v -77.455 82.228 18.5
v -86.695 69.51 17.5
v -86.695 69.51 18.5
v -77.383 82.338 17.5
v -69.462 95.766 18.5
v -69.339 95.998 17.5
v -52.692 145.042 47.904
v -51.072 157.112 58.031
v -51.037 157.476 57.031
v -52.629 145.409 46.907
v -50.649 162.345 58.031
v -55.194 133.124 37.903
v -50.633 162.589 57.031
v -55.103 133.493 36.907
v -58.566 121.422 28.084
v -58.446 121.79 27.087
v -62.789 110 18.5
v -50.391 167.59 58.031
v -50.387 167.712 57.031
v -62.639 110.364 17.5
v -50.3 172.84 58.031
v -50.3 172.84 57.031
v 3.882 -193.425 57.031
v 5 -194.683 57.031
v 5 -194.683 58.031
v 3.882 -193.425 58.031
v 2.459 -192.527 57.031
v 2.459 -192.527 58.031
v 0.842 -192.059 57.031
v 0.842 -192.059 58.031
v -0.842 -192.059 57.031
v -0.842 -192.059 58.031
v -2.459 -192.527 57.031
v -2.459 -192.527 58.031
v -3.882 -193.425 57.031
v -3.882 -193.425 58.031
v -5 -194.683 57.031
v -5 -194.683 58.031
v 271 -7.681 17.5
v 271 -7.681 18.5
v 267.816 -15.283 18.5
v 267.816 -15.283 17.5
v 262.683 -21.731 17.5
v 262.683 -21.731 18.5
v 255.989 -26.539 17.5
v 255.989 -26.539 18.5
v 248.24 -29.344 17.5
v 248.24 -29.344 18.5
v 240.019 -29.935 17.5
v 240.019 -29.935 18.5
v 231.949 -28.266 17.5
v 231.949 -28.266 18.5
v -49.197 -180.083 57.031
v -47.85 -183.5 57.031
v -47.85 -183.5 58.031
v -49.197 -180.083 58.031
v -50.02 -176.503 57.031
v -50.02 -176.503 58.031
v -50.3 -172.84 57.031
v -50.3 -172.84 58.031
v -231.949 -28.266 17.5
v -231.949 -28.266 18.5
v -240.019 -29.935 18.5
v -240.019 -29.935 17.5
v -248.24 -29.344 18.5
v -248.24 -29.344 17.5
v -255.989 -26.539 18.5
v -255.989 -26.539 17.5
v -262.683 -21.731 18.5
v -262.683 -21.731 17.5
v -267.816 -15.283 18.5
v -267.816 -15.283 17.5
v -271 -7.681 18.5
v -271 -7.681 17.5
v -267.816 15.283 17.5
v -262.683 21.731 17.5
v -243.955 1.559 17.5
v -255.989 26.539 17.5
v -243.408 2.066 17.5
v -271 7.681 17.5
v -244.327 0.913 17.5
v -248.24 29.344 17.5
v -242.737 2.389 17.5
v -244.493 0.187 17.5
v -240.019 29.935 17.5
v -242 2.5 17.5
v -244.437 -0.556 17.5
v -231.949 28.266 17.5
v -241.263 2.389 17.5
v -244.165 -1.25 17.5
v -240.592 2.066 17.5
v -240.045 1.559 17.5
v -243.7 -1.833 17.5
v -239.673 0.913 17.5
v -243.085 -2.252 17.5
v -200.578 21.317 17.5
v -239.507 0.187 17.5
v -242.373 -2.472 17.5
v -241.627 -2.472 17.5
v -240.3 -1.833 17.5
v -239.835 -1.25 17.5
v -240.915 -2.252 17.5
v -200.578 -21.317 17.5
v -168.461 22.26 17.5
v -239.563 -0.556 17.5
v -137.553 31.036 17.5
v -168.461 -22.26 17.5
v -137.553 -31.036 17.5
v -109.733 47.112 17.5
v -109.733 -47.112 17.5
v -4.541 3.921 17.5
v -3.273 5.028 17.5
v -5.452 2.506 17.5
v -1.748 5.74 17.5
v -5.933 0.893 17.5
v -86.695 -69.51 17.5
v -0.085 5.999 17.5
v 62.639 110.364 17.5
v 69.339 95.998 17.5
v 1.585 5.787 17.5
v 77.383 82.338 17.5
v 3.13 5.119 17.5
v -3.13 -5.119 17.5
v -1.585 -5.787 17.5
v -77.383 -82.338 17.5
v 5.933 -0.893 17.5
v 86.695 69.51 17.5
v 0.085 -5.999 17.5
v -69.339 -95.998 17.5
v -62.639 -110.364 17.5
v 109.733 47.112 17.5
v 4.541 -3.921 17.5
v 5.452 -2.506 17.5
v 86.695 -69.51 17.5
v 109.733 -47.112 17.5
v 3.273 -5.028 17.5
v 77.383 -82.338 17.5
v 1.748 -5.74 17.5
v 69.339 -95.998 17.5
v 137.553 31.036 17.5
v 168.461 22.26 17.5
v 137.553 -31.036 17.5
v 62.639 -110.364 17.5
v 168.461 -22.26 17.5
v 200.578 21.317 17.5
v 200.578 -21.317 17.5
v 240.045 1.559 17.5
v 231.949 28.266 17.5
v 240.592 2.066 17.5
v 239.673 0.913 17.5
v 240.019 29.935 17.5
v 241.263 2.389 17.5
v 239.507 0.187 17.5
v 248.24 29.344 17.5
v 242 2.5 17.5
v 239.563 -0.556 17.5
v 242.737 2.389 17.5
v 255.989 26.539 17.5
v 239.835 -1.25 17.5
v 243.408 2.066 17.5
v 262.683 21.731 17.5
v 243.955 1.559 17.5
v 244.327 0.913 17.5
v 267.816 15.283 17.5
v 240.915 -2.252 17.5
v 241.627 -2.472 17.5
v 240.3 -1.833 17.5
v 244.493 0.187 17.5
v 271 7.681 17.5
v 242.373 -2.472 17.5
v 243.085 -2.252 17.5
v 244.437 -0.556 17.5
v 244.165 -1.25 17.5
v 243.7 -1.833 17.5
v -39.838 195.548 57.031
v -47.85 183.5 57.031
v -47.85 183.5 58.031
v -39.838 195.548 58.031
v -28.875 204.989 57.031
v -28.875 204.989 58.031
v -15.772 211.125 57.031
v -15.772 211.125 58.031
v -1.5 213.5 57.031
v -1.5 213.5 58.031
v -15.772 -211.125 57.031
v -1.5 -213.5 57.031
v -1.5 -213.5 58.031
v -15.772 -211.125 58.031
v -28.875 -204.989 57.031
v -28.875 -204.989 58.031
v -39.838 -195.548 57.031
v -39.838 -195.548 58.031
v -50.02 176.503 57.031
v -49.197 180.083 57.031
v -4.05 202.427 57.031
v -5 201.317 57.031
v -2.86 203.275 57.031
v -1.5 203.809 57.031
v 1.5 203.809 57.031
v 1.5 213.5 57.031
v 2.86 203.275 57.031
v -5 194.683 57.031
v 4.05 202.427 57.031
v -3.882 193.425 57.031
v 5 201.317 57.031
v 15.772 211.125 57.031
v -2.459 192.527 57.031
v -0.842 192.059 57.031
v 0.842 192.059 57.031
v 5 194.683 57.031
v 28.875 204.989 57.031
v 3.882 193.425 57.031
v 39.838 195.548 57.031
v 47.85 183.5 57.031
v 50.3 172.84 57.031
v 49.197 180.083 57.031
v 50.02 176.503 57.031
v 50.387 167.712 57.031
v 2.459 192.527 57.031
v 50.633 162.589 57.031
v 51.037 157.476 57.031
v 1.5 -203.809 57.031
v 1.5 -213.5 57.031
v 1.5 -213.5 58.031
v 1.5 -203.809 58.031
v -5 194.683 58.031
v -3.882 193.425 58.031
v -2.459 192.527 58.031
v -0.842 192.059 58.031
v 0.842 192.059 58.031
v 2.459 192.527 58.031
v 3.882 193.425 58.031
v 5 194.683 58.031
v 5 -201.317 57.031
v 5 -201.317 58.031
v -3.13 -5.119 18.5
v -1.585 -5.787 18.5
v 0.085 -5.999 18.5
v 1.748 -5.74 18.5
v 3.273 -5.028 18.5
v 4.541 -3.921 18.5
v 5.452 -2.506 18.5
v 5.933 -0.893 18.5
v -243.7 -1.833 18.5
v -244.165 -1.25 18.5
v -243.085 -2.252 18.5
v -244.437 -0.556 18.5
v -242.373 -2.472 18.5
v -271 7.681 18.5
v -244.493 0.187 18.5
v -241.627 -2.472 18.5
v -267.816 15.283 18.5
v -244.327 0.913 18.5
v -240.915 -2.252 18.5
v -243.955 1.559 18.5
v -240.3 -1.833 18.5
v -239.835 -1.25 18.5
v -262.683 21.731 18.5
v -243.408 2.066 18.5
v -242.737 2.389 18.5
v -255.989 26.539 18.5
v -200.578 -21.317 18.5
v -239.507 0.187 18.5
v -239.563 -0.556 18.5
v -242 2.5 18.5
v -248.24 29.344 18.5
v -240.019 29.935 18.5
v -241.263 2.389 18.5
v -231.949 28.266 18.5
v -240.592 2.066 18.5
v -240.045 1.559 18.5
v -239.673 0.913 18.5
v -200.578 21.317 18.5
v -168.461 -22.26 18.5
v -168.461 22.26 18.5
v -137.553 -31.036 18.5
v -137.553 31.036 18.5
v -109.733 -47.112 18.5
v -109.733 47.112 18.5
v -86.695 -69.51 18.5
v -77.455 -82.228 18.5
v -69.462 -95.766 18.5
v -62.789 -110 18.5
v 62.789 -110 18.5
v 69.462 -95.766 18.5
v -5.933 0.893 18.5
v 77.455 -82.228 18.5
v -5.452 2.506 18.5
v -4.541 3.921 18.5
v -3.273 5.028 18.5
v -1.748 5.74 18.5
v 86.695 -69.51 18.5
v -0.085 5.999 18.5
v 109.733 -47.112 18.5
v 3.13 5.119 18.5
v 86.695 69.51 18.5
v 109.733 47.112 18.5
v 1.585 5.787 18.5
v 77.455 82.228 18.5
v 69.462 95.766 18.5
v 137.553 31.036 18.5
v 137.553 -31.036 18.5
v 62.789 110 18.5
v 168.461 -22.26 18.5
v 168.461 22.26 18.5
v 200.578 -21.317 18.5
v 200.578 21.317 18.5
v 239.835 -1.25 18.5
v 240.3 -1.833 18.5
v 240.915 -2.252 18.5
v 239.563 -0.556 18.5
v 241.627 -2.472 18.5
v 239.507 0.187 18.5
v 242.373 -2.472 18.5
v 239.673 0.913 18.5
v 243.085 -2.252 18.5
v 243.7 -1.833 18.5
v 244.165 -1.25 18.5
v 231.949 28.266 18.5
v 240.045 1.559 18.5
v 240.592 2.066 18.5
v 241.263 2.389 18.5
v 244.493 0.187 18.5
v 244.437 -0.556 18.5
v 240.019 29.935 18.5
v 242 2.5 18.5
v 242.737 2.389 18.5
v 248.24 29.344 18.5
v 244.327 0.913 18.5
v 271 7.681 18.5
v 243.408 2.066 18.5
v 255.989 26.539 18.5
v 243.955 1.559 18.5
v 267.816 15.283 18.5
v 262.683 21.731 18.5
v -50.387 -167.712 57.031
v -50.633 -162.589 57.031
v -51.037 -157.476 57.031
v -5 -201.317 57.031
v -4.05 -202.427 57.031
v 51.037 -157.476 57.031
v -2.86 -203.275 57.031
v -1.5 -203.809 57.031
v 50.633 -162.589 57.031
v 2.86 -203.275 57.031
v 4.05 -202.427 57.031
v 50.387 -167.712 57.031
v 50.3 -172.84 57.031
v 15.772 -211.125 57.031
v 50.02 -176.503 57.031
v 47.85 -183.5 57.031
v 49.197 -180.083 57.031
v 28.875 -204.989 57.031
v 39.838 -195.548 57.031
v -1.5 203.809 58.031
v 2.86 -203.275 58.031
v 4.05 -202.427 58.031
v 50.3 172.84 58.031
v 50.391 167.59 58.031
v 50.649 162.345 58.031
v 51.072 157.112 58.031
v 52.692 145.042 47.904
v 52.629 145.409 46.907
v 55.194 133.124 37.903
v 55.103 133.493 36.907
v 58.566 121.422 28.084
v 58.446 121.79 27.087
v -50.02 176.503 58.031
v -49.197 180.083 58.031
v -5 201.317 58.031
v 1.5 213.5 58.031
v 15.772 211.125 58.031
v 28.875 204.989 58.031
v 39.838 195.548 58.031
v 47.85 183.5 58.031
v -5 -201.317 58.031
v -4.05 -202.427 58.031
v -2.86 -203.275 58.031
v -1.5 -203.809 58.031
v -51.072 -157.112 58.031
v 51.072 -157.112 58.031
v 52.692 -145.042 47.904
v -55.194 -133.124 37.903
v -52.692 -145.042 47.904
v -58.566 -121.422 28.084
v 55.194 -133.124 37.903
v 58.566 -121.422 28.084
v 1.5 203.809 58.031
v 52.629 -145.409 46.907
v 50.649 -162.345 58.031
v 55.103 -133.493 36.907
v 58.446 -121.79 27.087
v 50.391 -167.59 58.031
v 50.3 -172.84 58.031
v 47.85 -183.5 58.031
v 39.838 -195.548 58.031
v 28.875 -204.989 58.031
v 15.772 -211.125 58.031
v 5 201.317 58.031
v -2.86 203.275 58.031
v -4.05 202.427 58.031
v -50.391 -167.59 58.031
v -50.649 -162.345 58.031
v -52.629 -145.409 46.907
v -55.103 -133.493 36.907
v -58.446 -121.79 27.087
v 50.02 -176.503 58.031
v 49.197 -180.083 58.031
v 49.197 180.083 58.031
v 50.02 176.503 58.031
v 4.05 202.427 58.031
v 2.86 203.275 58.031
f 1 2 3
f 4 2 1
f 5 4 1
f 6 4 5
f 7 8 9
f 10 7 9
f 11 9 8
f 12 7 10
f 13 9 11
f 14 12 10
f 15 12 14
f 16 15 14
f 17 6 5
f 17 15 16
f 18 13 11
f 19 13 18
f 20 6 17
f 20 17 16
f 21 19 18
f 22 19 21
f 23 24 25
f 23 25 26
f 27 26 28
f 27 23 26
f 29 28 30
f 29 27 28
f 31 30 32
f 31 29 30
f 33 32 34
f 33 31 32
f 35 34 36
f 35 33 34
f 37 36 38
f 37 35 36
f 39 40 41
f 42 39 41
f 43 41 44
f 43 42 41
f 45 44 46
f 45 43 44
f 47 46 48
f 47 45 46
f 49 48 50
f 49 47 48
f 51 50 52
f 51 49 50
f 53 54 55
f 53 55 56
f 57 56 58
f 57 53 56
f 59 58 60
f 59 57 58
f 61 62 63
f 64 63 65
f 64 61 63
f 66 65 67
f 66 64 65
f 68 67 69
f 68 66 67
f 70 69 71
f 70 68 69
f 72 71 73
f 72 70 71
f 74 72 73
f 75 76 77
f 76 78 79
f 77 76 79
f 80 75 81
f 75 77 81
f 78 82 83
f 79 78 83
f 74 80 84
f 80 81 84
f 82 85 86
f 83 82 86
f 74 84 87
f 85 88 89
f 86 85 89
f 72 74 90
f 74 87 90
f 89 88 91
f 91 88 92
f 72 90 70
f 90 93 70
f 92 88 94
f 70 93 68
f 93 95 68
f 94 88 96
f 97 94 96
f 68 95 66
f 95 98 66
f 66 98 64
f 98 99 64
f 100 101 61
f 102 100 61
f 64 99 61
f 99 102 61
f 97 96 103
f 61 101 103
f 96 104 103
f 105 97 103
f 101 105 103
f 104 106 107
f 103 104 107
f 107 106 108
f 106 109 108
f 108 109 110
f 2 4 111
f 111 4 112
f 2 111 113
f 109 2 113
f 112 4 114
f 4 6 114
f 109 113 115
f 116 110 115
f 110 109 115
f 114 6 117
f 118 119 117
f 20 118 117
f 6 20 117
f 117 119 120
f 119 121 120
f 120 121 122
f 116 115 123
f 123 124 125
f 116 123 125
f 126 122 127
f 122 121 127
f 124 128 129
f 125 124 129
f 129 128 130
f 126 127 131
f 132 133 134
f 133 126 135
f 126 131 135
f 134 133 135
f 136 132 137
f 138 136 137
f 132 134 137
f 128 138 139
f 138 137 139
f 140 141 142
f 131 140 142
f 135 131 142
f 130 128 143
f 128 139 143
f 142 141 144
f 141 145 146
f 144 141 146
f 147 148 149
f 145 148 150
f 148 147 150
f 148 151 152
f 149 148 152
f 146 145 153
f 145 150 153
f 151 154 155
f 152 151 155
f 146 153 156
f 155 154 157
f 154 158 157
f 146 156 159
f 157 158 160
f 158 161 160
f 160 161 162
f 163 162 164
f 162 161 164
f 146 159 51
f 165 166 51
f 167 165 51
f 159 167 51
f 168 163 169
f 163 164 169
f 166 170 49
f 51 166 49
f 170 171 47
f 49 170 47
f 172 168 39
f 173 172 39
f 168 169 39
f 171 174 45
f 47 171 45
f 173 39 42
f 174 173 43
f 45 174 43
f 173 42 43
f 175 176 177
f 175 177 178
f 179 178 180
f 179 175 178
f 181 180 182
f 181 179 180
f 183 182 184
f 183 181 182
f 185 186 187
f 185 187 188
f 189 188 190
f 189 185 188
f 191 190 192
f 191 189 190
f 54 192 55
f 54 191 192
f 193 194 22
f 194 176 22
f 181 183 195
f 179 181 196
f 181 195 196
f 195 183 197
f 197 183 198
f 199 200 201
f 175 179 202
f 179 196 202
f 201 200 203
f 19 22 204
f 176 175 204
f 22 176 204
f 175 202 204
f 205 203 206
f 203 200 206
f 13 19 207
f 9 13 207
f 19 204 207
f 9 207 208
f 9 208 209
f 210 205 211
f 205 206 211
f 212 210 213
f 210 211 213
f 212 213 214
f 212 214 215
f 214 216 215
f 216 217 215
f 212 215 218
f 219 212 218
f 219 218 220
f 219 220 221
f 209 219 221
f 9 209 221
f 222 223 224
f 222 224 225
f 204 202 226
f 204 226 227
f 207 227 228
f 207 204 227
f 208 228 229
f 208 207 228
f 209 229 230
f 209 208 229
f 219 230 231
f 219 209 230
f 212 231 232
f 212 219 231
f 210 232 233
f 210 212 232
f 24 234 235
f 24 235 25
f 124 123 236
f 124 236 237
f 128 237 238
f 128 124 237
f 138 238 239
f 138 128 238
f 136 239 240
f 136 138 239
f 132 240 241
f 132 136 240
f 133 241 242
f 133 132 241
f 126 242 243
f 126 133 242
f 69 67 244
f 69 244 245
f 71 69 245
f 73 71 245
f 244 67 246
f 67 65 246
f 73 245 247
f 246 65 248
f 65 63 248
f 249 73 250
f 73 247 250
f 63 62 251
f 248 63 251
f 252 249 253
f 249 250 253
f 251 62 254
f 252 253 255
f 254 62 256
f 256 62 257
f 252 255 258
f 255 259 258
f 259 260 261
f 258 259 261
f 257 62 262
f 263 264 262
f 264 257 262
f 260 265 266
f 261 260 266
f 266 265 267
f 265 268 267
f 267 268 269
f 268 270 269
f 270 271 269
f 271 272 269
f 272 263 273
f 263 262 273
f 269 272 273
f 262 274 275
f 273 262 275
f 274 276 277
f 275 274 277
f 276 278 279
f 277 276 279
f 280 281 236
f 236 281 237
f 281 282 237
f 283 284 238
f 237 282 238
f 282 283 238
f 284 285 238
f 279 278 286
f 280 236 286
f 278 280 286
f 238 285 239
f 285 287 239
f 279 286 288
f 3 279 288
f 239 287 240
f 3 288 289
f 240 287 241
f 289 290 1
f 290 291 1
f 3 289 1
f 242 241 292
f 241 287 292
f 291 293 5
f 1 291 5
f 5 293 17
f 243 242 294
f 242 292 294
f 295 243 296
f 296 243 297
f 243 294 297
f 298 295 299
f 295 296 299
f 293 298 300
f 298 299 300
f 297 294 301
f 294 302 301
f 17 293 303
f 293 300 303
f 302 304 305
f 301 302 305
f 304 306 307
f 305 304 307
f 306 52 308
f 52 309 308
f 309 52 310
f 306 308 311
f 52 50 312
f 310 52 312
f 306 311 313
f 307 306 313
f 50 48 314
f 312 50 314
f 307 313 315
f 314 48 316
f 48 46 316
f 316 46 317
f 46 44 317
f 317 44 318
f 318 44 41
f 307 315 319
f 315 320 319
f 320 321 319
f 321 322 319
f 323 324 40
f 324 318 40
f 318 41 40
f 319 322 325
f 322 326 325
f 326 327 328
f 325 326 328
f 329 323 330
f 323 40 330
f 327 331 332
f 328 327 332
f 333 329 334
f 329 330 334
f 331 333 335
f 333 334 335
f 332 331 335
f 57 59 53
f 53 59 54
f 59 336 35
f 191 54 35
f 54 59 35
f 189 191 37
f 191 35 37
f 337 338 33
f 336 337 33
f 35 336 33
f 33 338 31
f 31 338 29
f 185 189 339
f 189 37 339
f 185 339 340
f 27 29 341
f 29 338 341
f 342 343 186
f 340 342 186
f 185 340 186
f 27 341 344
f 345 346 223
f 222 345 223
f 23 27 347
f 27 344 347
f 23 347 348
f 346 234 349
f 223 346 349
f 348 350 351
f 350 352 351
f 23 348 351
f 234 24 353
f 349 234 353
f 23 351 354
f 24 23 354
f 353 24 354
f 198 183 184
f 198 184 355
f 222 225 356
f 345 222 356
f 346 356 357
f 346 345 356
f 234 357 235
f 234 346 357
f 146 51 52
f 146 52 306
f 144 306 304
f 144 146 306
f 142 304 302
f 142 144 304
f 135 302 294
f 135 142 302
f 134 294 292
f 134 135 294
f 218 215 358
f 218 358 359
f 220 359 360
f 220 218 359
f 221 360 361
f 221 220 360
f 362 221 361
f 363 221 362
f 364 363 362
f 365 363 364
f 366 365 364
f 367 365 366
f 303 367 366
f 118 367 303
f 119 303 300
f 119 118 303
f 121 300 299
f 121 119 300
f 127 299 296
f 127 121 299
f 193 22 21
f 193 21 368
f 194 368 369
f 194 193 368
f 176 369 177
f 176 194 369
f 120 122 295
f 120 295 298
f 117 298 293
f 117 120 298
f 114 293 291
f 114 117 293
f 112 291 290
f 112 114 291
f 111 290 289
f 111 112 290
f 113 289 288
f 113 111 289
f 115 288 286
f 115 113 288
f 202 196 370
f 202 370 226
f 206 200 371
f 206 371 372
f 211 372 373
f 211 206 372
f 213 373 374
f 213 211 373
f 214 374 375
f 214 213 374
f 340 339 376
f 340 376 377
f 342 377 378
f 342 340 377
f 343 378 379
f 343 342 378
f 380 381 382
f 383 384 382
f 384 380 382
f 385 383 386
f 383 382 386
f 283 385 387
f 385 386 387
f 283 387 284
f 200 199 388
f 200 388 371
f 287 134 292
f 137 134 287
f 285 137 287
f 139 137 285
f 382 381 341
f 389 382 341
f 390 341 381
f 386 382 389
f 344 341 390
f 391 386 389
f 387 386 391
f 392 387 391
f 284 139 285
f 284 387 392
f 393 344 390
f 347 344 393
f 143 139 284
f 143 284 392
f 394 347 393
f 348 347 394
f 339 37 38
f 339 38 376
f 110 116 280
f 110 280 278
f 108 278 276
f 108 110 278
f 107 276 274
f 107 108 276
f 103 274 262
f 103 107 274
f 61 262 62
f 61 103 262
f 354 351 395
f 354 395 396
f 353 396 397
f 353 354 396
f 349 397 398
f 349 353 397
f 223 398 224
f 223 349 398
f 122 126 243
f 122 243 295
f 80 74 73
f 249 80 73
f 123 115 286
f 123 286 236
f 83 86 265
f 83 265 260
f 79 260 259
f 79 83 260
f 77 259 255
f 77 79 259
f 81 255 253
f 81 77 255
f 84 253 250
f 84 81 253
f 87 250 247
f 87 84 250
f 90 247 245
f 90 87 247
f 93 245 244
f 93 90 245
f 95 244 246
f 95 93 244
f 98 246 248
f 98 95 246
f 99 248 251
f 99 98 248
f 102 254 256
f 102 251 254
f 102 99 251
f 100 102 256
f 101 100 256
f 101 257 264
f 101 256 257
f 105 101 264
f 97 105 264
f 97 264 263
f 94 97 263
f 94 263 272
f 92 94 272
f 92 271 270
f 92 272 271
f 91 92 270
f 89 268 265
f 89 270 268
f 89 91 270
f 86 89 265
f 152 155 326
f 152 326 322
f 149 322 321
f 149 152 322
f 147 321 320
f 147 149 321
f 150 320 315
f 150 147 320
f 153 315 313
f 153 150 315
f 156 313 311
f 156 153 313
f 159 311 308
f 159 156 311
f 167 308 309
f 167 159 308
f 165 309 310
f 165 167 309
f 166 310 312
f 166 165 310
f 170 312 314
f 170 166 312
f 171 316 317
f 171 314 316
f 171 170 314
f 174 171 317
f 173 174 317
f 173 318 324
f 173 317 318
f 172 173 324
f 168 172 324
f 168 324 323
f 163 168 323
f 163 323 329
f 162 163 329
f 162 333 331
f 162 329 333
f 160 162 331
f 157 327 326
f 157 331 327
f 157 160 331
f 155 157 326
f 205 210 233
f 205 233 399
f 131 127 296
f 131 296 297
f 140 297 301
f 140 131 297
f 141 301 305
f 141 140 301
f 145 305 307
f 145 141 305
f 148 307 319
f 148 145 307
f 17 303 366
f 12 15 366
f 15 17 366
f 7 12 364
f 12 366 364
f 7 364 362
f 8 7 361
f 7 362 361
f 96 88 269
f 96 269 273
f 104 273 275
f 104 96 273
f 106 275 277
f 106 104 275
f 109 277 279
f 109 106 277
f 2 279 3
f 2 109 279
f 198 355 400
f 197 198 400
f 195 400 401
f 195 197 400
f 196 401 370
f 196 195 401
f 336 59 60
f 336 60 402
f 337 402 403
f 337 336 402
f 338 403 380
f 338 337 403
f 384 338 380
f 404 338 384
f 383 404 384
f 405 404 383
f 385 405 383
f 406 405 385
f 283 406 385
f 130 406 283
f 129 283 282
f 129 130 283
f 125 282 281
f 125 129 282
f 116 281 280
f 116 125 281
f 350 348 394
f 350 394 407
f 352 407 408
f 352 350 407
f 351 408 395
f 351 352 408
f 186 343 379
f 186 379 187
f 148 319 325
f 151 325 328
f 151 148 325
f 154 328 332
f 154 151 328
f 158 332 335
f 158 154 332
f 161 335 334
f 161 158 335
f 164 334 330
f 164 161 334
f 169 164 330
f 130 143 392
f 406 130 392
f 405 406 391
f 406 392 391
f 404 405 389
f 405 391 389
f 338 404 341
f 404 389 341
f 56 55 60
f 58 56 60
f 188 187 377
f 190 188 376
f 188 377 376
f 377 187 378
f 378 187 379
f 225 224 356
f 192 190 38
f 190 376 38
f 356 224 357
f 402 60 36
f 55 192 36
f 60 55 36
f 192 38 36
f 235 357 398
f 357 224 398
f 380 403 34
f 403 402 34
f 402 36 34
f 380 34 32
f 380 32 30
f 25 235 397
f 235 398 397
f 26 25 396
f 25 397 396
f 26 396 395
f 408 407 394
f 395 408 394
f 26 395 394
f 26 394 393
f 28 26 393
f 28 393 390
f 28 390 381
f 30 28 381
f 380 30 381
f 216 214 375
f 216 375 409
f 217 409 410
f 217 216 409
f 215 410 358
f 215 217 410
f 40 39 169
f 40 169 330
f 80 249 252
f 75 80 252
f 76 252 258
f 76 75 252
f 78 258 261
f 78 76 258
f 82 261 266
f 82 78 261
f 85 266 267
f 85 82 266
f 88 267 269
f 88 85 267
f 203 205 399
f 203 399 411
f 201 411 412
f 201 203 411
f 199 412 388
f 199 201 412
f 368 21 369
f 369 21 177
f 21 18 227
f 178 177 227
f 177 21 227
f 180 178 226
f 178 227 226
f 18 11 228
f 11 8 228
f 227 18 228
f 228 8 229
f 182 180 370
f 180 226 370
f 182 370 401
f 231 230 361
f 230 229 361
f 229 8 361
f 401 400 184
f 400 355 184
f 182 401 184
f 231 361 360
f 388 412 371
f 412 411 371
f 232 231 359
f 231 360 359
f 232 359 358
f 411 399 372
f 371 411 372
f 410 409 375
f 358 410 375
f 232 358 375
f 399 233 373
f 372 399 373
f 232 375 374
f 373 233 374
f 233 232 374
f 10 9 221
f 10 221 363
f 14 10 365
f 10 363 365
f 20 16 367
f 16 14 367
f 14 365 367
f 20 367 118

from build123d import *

# Parameters (mm, degrees)
SALIENTE_EXTRUIR1_DEPTH     = 271
CORTAR_EXTRUIR9_DEPTH       = 372.904084134
CORTAR_EXTRUIR9_DEPTH_BACK  = 372.904084134
CROQUIS4_R                  = 2.5
CORTAR_EXTRUIR10_DEPTH      = 372.904084134
CORTAR_EXTRUIR10_DEPTH_BACK = 372.904084134
CROQUIS2_W                  = 600.899293422
CROQUIS2_H                  = 554.061756016


with BuildPart() as part:
    # Croquis1 → Saliente-Extruir1 (new, symmetric)
    with BuildSketch(Plane(origin=(0, 0, 0), x_dir=(0, 0, -1), z_dir=(1, 0, 0))):
        Polygon((-18.5, -110), (-18.5, 110), (-58.031437996, 157.111733252), (-58.031437996, 248), (-57.031437996, 248), (-57.031437996, 157.475703486), (-17.5, 110.363970234), (-17.5, -110.363970234), (-57.031437996, -157.475703486), (-57.031437996, -248), (-58.031437996, -248), (-58.031437996, -157.111733252), align=None)
    extrude(amount=SALIENTE_EXTRUIR1_DEPTH, both=True)

    # Croquis4 → Cortar-Extruir9 (cut, two sides: drawn at the far end of the back side and taken through both)
    with BuildSketch(Plane.XY.offset(-CORTAR_EXTRUIR9_DEPTH_BACK)):
        with Locations(Location((-242, 0, 0), (0, 0, 90))):
            Circle(CROQUIS4_R)
        with Locations(Location((242, 0, 0), (0, 0, 90))):
            Circle(CROQUIS4_R)
        with BuildLine():
            Line((-5, 201.31662479), (-5, 194.68337521))
            ThreePointArc((-5, 194.68337521), (0, 192), (5, 194.68337521))
            Line((5, 194.68337521), (5, 201.31662479))
            ThreePointArc((5, 201.31662479), (0, 204), (-5, 201.31662479))
        make_face()
        with BuildLine():
            Line((5, -201.31662479), (5, -194.68337521))
            ThreePointArc((5, -194.68337521), (0, -192), (-5, -194.68337521))
            Line((-5, -194.68337521), (-5, -201.31662479))
            ThreePointArc((-5, -201.31662479), (0, -204), (5, -201.31662479))
        make_face()
        with BuildLine():
            Line((-5.933205139, 0.892791565), (-3.129872731, -5.118974183))
            ThreePointArc((-3.129872731, -5.118974183), (2.53570957, -5.437846722), (5.933205139, -0.892791565))
            Line((5.933205139, -0.892791565), (3.129872731, 5.118974183))
            ThreePointArc((3.129872731, 5.118974183), (-2.53570957, 5.437846722), (-5.933205139, 0.892791565))
        make_face()
    extrude(amount=CORTAR_EXTRUIR9_DEPTH + CORTAR_EXTRUIR9_DEPTH_BACK, mode=Mode.SUBTRACT)

    # Croquis2 → Cortar-Extruir10 (cut, two sides: drawn at the far end of the back side and taken through both)
    with BuildSketch(Plane.XY.offset(-CORTAR_EXTRUIR10_DEPTH_BACK)):
        Rectangle(CROQUIS2_W, CROQUIS2_H)
        with BuildLine():
            Line((1.5, 198), (1.5, 213.5))
            ThreePointArc((1.5, 213.5), (28.875083063, 204.989128333), (47.85, 183.5))
            ThreePointArc((47.85, 183.5), (49.675606578, 178.308038097), (50.3, 172.84))
            ThreePointArc((50.3, 172.84), (59.704263449, 118.077622514), (86.695218386, 69.509664861))
            ThreePointArc((86.695218386, 69.509664861), (152.735315328, 25.690942775), (231.948594909, 28.266044217))
            ThreePointArc((231.948594909, 28.266044217), (272, 0), (231.948594909, -28.266044217))
            ThreePointArc((231.948594909, -28.266044217), (152.735315328, -25.690942775), (86.695218386, -69.509664861))
            ThreePointArc((86.695218386, -69.509664861), (59.704263449, -118.077622514), (50.3, -172.84))
            ThreePointArc((50.3, -172.84), (49.675606578, -178.308038097), (47.85, -183.5))
            ThreePointArc((47.85, -183.5), (28.875083063, -204.989128333), (1.5, -213.5))
            Line((1.5, -213.5), (1.5, -198))
            Line((1.5, -198), (-1.5, -198))
            Line((-1.5, -198), (-1.5, -213.5))
            ThreePointArc((-1.5, -213.5), (-28.875083063, -204.989128333), (-47.85, -183.5))
            ThreePointArc((-47.85, -183.5), (-49.675606578, -178.308038097), (-50.3, -172.84))
            ThreePointArc((-50.3, -172.84), (-59.704263449, -118.077622514), (-86.695218386, -69.509664861))
            ThreePointArc((-86.695218386, -69.509664861), (-152.735315328, -25.690942775), (-231.948594909, -28.266044217))
            ThreePointArc((-231.948594909, -28.266044217), (-272, 0), (-231.948594909, 28.266044217))
            ThreePointArc((-231.948594909, 28.266044217), (-152.735315328, 25.690942775), (-86.695218386, 69.509664861))
            ThreePointArc((-86.695218386, 69.509664861), (-59.704263449, 118.077622514), (-50.3, 172.84))
            ThreePointArc((-50.3, 172.84), (-49.675606578, 178.308038097), (-47.85, 183.5))
            ThreePointArc((-47.85, 183.5), (-28.875083063, 204.989128333), (-1.5, 213.5))
            Line((-1.5, 213.5), (-1.5, 198))
            Line((-1.5, 198), (1.5, 198))
        make_face(mode=Mode.SUBTRACT)
    extrude(amount=CORTAR_EXTRUIR10_DEPTH + CORTAR_EXTRUIR10_DEPTH_BACK, mode=Mode.SUBTRACT)


solid = part.part
